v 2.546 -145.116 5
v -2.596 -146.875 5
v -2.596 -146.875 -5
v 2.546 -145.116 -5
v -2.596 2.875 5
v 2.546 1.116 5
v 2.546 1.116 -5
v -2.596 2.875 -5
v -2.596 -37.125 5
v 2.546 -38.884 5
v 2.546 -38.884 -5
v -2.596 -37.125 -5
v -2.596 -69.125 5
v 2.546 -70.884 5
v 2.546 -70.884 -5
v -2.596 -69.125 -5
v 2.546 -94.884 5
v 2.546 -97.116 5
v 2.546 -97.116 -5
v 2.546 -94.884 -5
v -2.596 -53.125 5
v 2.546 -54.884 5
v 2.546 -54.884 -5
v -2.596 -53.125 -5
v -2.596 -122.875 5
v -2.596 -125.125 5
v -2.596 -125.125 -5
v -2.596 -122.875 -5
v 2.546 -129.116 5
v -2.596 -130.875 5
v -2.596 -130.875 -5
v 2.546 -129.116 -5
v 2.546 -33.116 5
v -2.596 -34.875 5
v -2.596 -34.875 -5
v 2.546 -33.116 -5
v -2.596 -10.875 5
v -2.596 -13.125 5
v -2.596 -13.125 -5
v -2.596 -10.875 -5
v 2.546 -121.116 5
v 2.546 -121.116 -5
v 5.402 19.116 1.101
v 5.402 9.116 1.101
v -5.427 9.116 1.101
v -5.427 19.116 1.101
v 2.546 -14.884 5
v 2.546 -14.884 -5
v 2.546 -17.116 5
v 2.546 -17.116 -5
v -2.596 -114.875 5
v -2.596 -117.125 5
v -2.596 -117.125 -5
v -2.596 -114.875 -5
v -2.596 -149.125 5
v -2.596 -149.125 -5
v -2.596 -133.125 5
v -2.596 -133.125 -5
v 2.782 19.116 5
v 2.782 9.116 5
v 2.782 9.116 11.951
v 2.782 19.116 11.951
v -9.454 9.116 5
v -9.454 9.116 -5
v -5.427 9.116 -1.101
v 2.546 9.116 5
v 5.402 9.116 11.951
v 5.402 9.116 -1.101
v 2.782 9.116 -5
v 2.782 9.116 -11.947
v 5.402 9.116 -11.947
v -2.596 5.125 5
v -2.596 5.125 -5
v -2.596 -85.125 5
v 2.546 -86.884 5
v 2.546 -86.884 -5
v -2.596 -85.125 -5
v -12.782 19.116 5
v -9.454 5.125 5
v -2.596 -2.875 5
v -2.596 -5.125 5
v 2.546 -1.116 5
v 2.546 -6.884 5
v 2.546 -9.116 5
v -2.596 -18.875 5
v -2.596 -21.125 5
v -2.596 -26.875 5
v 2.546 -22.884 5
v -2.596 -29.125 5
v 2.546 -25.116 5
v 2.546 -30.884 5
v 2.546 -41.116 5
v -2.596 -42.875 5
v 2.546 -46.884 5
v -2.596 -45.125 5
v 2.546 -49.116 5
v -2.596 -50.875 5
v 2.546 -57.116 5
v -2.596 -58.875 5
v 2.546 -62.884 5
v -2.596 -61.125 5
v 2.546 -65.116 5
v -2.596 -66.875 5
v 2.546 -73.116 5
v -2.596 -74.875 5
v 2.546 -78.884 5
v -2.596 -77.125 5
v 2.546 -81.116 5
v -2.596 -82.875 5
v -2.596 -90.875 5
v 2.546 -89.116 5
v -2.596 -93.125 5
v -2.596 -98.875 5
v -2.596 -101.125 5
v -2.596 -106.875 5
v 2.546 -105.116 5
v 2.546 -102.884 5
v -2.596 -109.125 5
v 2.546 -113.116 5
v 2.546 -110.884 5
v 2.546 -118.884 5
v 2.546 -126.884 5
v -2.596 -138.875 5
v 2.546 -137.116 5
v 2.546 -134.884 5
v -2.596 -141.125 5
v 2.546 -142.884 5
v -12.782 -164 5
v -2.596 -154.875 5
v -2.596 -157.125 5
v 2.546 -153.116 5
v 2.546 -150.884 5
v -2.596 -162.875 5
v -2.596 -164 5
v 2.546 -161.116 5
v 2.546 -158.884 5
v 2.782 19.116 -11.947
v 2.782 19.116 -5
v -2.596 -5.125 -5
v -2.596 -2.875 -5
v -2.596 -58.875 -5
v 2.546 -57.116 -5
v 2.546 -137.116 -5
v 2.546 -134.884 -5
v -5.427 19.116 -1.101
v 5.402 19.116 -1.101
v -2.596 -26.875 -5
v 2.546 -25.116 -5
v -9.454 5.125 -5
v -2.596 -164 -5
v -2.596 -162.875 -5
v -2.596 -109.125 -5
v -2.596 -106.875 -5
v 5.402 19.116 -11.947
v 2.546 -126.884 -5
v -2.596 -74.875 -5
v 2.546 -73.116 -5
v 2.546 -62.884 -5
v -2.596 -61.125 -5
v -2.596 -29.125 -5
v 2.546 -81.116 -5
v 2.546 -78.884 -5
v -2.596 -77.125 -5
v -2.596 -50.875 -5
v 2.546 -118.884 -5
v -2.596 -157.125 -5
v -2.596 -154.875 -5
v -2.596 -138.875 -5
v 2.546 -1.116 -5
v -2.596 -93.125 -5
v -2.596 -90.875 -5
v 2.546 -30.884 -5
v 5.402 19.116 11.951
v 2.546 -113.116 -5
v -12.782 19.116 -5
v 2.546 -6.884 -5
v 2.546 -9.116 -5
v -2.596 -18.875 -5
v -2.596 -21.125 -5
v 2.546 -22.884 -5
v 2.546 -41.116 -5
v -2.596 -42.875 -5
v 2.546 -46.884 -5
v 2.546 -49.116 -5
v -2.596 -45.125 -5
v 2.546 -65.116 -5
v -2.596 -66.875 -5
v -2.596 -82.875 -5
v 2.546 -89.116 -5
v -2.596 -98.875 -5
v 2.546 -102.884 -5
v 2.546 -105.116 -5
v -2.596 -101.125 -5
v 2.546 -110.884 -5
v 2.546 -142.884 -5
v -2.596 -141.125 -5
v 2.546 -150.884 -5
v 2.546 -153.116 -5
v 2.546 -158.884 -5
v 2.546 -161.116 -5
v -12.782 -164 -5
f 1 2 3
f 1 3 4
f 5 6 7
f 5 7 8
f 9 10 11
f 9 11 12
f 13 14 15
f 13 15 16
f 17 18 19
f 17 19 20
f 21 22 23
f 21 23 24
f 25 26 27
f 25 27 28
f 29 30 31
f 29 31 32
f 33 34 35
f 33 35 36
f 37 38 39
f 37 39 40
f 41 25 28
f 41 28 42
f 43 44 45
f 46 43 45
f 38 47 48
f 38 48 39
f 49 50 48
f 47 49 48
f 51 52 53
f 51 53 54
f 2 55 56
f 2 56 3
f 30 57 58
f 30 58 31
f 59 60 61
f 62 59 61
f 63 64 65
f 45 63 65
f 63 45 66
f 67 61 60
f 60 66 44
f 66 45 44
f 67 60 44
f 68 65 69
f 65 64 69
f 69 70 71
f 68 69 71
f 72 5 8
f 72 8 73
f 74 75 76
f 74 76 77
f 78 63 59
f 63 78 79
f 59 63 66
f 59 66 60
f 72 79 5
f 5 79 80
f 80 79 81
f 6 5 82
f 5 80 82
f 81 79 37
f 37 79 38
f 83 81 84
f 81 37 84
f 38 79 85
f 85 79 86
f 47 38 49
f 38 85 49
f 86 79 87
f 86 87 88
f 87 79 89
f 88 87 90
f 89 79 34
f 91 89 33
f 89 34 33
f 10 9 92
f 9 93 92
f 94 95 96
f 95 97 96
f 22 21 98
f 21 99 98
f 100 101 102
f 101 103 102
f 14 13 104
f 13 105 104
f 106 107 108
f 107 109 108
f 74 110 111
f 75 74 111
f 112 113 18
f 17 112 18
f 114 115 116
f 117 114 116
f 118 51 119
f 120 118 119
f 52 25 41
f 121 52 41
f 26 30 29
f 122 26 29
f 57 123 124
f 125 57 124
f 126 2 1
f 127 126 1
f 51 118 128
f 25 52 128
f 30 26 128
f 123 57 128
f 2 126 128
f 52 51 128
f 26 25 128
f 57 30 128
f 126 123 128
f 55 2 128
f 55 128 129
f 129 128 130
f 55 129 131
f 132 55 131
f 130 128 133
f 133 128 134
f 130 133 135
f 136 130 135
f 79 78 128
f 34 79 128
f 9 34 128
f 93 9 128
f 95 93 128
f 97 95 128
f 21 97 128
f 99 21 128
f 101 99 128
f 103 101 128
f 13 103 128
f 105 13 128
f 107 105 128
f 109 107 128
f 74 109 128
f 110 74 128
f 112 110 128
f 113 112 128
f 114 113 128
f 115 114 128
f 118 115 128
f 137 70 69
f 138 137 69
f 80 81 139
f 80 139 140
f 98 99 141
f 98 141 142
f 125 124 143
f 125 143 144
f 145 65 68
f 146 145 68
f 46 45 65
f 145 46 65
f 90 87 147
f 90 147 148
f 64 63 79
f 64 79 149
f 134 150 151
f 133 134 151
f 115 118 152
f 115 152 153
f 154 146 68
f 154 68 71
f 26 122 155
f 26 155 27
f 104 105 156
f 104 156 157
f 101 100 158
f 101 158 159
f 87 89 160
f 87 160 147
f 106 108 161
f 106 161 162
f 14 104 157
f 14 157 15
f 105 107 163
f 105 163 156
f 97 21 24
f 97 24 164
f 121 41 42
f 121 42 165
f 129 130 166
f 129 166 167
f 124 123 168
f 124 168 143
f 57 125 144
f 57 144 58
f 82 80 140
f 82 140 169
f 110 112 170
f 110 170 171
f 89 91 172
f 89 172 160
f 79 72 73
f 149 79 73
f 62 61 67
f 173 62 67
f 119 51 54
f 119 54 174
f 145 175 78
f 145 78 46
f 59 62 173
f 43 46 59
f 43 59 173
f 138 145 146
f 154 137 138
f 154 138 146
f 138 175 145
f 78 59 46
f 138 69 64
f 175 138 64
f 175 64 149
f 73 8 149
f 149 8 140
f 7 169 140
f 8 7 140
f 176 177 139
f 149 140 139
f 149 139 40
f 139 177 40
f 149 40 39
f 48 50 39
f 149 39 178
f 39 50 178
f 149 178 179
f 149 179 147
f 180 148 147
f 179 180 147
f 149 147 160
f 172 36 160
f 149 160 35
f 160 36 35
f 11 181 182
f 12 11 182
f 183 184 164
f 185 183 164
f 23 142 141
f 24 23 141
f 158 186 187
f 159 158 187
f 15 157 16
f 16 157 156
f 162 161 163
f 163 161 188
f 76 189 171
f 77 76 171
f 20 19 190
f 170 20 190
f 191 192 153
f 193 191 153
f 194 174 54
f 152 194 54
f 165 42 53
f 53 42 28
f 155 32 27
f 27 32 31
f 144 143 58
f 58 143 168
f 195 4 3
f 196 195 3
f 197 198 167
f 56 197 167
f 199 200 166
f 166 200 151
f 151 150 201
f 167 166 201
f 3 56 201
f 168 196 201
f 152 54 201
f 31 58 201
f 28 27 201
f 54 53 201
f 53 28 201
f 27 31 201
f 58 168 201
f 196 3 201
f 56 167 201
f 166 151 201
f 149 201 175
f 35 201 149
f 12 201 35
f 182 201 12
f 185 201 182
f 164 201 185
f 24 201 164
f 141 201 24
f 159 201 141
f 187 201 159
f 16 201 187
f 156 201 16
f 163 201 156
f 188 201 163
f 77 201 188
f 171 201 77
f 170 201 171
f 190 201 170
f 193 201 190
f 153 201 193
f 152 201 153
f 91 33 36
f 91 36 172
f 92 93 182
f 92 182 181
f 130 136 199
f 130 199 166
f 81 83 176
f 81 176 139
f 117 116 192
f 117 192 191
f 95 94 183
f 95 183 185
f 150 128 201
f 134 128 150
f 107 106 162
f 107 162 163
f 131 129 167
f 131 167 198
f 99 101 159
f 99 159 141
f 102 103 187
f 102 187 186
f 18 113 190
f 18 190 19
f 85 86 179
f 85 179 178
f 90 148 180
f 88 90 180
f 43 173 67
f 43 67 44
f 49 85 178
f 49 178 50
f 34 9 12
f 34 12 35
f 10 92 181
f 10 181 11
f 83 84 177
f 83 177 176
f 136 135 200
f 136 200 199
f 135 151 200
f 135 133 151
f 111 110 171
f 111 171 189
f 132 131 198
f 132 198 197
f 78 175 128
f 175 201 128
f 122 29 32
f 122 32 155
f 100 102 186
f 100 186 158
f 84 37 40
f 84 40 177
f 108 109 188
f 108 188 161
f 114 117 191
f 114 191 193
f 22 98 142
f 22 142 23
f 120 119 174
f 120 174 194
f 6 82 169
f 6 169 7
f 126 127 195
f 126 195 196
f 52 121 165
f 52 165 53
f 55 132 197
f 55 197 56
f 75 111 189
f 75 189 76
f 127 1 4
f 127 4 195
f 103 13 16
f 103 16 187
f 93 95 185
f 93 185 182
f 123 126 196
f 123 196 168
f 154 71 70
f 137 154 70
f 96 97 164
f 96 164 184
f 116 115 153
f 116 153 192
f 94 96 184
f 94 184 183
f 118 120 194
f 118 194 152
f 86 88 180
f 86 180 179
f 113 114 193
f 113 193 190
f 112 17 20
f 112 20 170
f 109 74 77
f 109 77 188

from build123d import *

# Parameters (mm, degrees)
RESSALTO_EXTRUS_O1_DEPTH = 5
BOSS_EXTRUDE1_DEPTH      = 10
CUT_EXTRUDE1_DEPTH       = 50
SKETCH3_W                = 10
SKETCH3_H                = 3.990496563
CUT_EXTRUDE2_DEPTH       = 12


with BuildPart() as part:
    # Esboço1 → Ressalto-extrusão1 (new, symmetric)
    with BuildSketch(Plane.XY):
        Polygon((-2.596479089, -162.874745928), (2.546479089, -161.115750635), (2.546479089, -158.884249365), (-2.596479089, -157.125254072), (-2.596479089, -154.874745928), (2.546479089, -153.115750635), (2.546479089, -150.884249365), (-2.596479089, -149.125254072), (-2.596479089, -146.874745928), (2.546479089, -145.115750635), (2.546479089, -142.884249365), (-2.596479089, -141.125254072), (-2.596479089, -138.874745928), (2.546479089, -137.115750635), (2.546479089, -134.884249365), (-2.596479089, -133.125254072), (-2.596479089, -130.874745928), (2.546479089, -129.115750635), (2.546479089, -126.884249365), (-2.596479089, -125.125254072), (-2.596479089, -122.874745928), (2.546479089, -121.115750635), (2.546479089, -118.884249365), (-2.596479089, -117.125254072), (-2.596479089, -114.874745928), (2.546479089, -113.115750635), (2.546479089, -110.884249365), (-2.596479089, -109.125254072), (-2.596479089, -106.874745928), (2.546479089, -105.115750635), (2.546479089, -102.884249365), (-2.596479089, -101.125254072), (-2.596479089, -98.874745928), (2.546479089, -97.115750635), (2.546479089, -94.884249365), (-2.596479089, -93.125254072), (-2.596479089, -90.874745928), (2.546479089, -89.115750635), (2.546479089, -86.884249365), (-2.596479089, -85.125254072), (-2.596479089, -82.874745928), (2.546479089, -81.115750635), (2.546479089, -78.884249365), (-2.596479089, -77.125254072), (-2.596479089, -74.874745928), (2.546479089, -73.115750635), (2.546479089, -70.884249365), (-2.596479089, -69.125254072), (-2.596479089, -66.874745928), (2.546479089, -65.115750635), (2.546479089, -62.884249365), (-2.596479089, -61.125254072), (-2.596479089, -58.874745928), (2.546479089, -57.115750635), (2.546479089, -54.884249365), (-2.596479089, -53.125254072), (-2.596479089, -50.874745928), (2.546479089, -49.115750635), (2.546479089, -46.884249365), (-2.596479089, -45.125254072), (-2.596479089, -42.874745928), (2.546479089, -41.115750635), (2.546479089, -38.884249365), (-2.596479089, -37.125254072), (-2.596479089, -34.874745928), (2.546479089, -33.115750635), (2.546479089, -30.884249365), (-2.596479089, -29.125254072), (-2.596479089, -26.874745928), (2.546479089, -25.115750635), (2.546479089, -22.884249365), (-2.596479089, -21.125254072), (-2.596479089, -18.874745928), (2.546479089, -17.115750635), (2.546479089, -14.884249365), (-2.596479089, -13.125254072), (-2.596479089, -10.874745928), (2.546479089, -9.115750635), (2.546479089, -6.884249365), (-2.596479089, -5.125254072), (-2.596479089, -2.874745928), (2.546479089, -1.115750635), (2.546479089, 1.115750635), (-2.596479089, 2.874745928), (-2.596479089, 5.125254072), (2.546479089, 6.884249365), (2.546479089, 9.115750635), (-12.782395447, 9.115750635), (-12.782395447, -164), (-2.596479089, -164), align=None)
    extrude(amount=RESSALTO_EXTRUS_O1_DEPTH, both=True)

    # Sketch1 → Boss-Extrude1 (add)
    with BuildSketch(Plane(origin=(0, 9.115750635, 0), x_dir=(1, 0, 0), z_dir=(0, 1, 0))):
        Polygon((2.782395447, 5), (-12.782395447, 5), (-12.782395447, -5), (2.782395447, -5), (2.782395447, -11.950821596), (7.782395447, -11.950821596), (12.782395447, -11.950821596), (12.782395447, -1.100821596), (7.782395447, -1.100821596), (-5.426721346, -1.100821596), (-5.426721346, 1.100821596), (2.782395447, 1.100821596), (12.782395447, 1.100821596), (12.782395447, 11.946726984), (7.782395447, 11.946726984), (2.782395447, 11.946726984), align=None)
    extrude(amount=BOSS_EXTRUDE1_DEPTH)

    # Sketch2 → Cut-Extrude1 (cut)
    with BuildSketch(Plane(origin=(0, 19.115750635, 0), x_dir=(1, 0, 0), z_dir=(0, 1, 0))):
        Polygon((10.616582745, 13.051407562), (13.445399336, 13.051407562), (13.445399336, -14.793690682), (10.616582745, -14.793690682), (5.402017224, -14.793690682), (5.402017224, 13.051407562), align=None)
    extrude(amount=-CUT_EXTRUDE1_DEPTH, mode=Mode.SUBTRACT)

    # Sketch3 → Cut-Extrude2 (cut)
    with BuildSketch(Plane(origin=(2.546479089, 0, 0), x_dir=(0, 0, -1), z_dir=(1, 0, 0))):
        with Locations((0, 7.120502354)):
            Rectangle(SKETCH3_W, SKETCH3_H)
    extrude(amount=-CUT_EXTRUDE2_DEPTH, mode=Mode.SUBTRACT)


solid = part.part
